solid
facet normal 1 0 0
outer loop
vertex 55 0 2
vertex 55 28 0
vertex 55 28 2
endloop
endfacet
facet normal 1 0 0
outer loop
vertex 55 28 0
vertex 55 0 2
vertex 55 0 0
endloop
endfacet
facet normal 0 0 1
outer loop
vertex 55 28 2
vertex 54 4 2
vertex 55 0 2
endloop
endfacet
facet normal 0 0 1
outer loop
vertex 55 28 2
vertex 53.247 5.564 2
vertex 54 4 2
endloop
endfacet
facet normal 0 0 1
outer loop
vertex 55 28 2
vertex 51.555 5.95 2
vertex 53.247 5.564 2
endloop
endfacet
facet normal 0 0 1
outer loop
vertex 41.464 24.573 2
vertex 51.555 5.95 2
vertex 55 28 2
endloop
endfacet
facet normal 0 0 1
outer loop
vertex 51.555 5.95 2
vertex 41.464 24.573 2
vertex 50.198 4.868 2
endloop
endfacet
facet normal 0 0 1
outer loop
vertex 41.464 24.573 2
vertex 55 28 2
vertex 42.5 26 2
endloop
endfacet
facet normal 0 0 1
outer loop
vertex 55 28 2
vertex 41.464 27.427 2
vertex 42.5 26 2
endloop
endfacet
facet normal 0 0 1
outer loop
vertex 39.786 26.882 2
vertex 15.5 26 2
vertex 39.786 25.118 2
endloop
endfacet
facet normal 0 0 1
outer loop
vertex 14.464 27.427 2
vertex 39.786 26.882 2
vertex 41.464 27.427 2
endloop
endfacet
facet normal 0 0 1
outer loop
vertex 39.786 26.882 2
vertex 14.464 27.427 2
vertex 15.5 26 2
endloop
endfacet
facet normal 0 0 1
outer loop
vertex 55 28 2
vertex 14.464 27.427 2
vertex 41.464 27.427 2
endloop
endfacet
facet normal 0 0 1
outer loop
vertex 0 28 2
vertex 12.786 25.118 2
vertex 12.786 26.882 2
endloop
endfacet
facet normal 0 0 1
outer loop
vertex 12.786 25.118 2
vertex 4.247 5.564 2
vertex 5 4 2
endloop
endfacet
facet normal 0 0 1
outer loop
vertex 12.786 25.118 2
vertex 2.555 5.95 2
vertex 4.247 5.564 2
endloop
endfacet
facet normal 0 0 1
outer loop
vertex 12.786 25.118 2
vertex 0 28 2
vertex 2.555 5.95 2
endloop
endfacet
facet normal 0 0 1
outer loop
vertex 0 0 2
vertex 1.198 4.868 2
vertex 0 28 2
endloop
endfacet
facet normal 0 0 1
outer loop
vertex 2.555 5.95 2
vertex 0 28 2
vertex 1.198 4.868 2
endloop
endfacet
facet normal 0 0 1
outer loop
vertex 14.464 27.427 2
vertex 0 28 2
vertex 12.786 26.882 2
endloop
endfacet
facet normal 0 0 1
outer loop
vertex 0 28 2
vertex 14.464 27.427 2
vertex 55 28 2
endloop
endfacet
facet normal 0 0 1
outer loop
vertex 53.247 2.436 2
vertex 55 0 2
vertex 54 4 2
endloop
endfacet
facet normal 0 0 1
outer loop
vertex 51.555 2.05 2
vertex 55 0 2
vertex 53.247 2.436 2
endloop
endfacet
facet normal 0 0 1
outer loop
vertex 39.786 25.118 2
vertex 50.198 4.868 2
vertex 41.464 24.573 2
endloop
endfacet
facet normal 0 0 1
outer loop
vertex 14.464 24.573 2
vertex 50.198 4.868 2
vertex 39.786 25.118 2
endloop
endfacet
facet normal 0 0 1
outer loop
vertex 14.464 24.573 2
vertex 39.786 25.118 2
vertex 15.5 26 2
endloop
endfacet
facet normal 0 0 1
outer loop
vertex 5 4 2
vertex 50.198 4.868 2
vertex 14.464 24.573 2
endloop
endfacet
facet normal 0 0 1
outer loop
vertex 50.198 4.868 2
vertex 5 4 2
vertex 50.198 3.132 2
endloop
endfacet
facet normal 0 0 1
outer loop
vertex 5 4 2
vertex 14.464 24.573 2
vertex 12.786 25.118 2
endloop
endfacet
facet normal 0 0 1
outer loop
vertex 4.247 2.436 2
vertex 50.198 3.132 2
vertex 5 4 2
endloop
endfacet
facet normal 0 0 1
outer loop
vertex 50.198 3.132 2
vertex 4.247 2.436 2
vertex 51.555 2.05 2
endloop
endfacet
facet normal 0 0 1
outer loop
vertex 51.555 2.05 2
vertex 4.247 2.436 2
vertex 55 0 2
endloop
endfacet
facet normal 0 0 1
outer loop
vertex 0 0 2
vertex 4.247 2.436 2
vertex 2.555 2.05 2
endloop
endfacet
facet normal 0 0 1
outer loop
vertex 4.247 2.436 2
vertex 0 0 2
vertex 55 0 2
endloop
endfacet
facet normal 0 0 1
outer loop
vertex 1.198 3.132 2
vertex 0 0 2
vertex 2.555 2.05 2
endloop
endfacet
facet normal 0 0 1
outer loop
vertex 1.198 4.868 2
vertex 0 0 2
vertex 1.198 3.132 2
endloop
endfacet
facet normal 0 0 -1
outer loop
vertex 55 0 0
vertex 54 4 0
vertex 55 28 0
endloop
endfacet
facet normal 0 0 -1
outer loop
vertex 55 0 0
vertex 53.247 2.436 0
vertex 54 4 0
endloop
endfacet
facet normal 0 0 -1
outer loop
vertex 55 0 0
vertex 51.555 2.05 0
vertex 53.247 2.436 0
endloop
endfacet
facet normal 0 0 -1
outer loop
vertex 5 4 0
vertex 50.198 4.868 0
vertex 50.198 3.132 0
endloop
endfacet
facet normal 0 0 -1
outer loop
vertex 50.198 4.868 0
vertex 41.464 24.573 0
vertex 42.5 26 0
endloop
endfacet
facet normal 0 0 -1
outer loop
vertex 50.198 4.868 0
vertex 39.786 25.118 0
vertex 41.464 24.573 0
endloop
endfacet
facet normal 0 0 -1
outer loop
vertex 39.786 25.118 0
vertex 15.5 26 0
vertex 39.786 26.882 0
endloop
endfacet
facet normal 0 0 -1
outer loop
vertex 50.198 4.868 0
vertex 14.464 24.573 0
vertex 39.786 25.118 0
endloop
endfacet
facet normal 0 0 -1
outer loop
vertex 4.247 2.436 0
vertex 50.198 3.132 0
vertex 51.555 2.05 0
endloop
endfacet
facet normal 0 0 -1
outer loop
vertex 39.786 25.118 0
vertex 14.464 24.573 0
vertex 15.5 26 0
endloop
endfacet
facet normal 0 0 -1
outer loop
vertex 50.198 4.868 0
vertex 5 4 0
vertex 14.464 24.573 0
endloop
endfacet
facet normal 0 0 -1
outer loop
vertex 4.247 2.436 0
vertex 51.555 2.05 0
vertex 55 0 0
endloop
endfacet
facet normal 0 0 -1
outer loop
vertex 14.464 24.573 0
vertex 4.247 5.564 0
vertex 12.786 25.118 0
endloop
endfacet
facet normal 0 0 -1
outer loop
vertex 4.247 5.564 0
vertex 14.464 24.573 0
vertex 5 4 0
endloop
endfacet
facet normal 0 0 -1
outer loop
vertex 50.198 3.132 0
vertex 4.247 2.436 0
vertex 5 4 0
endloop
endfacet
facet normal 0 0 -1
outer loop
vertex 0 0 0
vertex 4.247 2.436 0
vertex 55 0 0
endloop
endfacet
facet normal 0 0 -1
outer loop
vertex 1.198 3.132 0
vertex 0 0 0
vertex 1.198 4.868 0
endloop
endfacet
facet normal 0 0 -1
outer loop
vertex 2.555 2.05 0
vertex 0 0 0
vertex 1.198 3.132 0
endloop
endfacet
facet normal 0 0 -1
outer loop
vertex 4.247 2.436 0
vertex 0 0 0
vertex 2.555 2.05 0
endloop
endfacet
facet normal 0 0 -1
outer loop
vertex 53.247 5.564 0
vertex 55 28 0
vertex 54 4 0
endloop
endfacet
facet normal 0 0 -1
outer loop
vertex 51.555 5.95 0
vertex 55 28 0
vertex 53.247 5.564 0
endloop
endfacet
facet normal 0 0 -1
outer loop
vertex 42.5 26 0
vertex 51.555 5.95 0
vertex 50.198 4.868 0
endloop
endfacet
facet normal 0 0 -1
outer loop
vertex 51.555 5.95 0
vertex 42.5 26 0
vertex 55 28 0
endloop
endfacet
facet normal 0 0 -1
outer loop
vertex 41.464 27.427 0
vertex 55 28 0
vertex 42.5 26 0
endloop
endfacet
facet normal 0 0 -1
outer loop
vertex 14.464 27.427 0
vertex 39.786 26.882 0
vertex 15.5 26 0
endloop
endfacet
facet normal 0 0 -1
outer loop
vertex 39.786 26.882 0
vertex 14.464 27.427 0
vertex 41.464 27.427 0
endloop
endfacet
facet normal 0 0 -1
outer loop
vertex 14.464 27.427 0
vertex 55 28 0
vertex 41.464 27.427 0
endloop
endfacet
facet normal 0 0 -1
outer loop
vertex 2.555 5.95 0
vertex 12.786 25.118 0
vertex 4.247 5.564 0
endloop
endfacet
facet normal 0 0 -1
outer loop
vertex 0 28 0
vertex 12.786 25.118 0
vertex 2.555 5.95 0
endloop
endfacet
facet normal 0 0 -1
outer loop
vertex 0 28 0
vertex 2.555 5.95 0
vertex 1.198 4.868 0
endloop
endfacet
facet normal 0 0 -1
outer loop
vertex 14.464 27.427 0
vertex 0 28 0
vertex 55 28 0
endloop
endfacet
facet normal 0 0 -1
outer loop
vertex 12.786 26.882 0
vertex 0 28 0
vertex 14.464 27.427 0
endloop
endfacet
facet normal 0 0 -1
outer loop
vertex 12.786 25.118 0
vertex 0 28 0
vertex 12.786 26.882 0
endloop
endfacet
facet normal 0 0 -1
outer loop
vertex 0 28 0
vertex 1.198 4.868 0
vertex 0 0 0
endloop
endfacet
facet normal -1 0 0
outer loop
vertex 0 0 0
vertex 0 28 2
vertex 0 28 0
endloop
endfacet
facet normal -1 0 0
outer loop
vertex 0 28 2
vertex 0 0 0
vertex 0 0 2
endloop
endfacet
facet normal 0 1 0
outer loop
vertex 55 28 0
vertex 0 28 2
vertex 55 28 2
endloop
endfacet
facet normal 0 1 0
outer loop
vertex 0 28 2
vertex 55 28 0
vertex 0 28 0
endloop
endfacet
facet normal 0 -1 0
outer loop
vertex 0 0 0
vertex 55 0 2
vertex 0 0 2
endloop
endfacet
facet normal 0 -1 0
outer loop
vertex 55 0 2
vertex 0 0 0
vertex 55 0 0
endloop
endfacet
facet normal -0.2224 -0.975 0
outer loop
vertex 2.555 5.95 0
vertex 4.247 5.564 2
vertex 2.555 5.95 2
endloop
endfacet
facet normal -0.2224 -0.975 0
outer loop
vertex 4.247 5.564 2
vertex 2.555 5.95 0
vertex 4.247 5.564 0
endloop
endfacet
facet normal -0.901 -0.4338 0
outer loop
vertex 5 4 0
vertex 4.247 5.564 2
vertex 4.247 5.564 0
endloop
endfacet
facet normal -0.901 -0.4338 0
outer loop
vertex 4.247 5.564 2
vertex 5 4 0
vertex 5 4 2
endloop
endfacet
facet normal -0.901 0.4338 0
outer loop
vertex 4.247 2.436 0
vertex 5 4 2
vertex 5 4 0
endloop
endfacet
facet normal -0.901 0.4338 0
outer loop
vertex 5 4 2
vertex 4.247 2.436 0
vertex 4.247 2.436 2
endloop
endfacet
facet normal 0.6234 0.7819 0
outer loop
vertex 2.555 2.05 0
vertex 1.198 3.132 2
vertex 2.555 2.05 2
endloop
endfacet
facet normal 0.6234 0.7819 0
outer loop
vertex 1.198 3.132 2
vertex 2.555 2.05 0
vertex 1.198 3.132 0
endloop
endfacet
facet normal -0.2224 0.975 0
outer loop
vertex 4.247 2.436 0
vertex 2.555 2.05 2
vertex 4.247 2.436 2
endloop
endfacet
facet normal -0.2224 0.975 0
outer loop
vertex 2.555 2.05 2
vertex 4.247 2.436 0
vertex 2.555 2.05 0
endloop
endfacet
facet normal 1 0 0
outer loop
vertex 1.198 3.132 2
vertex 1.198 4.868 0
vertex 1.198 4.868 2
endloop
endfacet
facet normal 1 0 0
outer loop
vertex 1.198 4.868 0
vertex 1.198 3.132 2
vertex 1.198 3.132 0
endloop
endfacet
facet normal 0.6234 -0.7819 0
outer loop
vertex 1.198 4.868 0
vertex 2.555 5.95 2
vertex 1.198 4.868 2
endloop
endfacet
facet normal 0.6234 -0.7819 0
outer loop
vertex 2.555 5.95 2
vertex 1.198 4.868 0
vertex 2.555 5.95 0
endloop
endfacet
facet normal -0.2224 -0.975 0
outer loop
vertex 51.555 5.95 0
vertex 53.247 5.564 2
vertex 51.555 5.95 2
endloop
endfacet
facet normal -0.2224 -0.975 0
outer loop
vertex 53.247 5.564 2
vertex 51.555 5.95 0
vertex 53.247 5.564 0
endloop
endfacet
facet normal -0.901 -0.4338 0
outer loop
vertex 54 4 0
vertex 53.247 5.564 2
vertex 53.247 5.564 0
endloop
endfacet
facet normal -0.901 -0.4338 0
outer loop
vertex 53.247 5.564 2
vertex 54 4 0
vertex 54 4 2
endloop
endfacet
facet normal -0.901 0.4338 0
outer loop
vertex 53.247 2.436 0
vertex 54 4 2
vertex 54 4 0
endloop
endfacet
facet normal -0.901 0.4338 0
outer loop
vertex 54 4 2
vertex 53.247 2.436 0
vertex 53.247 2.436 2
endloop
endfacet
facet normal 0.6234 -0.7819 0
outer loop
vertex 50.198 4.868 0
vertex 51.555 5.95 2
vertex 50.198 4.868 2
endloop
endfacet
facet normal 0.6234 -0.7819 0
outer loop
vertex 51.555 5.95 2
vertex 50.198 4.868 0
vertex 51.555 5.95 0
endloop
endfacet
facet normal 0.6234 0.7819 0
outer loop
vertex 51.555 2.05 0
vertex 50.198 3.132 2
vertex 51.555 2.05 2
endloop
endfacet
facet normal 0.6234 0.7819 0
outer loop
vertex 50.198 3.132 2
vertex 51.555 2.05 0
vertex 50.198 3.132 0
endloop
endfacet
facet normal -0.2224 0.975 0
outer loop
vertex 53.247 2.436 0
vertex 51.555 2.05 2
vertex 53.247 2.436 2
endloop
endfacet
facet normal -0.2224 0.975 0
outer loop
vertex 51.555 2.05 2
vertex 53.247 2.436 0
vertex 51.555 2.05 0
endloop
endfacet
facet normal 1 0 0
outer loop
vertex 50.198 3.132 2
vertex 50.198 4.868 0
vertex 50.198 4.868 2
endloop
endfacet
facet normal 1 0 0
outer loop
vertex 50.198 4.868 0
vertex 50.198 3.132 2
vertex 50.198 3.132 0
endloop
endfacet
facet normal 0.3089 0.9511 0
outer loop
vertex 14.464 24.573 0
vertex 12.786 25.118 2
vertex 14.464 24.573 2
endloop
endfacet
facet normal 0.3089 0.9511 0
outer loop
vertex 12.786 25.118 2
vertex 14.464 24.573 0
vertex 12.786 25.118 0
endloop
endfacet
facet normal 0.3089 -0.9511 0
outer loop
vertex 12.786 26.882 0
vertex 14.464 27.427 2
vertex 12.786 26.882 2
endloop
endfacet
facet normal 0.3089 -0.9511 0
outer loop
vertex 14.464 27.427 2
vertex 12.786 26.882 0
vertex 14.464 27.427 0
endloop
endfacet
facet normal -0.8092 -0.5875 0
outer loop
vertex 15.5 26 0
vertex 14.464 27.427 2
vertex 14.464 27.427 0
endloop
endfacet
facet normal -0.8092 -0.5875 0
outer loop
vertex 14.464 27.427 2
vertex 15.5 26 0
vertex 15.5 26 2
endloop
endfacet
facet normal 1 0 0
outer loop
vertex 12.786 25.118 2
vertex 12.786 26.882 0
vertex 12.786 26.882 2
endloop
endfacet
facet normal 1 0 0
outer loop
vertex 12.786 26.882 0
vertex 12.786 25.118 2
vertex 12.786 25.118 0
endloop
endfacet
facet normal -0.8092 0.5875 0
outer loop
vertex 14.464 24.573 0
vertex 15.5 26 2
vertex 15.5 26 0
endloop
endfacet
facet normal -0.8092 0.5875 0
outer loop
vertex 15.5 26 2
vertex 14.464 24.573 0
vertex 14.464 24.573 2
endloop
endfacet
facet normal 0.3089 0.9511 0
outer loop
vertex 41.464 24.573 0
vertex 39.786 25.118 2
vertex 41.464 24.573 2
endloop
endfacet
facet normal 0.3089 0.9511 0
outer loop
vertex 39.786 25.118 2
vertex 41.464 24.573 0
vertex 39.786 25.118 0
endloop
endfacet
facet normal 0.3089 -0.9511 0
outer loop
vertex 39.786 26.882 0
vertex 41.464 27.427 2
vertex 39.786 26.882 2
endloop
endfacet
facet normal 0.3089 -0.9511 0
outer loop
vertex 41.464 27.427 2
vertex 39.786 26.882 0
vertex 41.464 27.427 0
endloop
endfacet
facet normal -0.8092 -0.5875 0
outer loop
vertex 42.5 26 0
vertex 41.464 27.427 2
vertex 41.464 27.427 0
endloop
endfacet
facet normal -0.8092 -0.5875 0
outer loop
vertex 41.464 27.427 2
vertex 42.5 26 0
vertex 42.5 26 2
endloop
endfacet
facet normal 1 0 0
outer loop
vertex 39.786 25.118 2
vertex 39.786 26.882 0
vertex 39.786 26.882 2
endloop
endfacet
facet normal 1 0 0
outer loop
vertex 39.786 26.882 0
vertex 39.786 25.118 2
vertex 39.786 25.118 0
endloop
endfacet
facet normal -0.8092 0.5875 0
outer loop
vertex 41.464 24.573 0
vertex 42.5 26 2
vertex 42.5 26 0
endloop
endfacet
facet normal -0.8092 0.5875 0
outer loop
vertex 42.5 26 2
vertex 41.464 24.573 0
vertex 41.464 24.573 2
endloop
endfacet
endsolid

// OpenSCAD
            difference(){
                cube([55,28,2]);
                //Troux pour l'Arduino
                translate([3,4,0]){
                    cylinder(r=2,h=6);
                }
                translate([52,4,0]){
                    cylinder(r=2,h=6);
                }
                //Troux pour support de la batterie:
                translate([27.5-13.5,26,0]){
                    cylinder(r=1.5,h=6); 
                }
                translate([27.5+13.5,26,0]){
                    cylinder(r=1.5,h=6); 
                }
            }
